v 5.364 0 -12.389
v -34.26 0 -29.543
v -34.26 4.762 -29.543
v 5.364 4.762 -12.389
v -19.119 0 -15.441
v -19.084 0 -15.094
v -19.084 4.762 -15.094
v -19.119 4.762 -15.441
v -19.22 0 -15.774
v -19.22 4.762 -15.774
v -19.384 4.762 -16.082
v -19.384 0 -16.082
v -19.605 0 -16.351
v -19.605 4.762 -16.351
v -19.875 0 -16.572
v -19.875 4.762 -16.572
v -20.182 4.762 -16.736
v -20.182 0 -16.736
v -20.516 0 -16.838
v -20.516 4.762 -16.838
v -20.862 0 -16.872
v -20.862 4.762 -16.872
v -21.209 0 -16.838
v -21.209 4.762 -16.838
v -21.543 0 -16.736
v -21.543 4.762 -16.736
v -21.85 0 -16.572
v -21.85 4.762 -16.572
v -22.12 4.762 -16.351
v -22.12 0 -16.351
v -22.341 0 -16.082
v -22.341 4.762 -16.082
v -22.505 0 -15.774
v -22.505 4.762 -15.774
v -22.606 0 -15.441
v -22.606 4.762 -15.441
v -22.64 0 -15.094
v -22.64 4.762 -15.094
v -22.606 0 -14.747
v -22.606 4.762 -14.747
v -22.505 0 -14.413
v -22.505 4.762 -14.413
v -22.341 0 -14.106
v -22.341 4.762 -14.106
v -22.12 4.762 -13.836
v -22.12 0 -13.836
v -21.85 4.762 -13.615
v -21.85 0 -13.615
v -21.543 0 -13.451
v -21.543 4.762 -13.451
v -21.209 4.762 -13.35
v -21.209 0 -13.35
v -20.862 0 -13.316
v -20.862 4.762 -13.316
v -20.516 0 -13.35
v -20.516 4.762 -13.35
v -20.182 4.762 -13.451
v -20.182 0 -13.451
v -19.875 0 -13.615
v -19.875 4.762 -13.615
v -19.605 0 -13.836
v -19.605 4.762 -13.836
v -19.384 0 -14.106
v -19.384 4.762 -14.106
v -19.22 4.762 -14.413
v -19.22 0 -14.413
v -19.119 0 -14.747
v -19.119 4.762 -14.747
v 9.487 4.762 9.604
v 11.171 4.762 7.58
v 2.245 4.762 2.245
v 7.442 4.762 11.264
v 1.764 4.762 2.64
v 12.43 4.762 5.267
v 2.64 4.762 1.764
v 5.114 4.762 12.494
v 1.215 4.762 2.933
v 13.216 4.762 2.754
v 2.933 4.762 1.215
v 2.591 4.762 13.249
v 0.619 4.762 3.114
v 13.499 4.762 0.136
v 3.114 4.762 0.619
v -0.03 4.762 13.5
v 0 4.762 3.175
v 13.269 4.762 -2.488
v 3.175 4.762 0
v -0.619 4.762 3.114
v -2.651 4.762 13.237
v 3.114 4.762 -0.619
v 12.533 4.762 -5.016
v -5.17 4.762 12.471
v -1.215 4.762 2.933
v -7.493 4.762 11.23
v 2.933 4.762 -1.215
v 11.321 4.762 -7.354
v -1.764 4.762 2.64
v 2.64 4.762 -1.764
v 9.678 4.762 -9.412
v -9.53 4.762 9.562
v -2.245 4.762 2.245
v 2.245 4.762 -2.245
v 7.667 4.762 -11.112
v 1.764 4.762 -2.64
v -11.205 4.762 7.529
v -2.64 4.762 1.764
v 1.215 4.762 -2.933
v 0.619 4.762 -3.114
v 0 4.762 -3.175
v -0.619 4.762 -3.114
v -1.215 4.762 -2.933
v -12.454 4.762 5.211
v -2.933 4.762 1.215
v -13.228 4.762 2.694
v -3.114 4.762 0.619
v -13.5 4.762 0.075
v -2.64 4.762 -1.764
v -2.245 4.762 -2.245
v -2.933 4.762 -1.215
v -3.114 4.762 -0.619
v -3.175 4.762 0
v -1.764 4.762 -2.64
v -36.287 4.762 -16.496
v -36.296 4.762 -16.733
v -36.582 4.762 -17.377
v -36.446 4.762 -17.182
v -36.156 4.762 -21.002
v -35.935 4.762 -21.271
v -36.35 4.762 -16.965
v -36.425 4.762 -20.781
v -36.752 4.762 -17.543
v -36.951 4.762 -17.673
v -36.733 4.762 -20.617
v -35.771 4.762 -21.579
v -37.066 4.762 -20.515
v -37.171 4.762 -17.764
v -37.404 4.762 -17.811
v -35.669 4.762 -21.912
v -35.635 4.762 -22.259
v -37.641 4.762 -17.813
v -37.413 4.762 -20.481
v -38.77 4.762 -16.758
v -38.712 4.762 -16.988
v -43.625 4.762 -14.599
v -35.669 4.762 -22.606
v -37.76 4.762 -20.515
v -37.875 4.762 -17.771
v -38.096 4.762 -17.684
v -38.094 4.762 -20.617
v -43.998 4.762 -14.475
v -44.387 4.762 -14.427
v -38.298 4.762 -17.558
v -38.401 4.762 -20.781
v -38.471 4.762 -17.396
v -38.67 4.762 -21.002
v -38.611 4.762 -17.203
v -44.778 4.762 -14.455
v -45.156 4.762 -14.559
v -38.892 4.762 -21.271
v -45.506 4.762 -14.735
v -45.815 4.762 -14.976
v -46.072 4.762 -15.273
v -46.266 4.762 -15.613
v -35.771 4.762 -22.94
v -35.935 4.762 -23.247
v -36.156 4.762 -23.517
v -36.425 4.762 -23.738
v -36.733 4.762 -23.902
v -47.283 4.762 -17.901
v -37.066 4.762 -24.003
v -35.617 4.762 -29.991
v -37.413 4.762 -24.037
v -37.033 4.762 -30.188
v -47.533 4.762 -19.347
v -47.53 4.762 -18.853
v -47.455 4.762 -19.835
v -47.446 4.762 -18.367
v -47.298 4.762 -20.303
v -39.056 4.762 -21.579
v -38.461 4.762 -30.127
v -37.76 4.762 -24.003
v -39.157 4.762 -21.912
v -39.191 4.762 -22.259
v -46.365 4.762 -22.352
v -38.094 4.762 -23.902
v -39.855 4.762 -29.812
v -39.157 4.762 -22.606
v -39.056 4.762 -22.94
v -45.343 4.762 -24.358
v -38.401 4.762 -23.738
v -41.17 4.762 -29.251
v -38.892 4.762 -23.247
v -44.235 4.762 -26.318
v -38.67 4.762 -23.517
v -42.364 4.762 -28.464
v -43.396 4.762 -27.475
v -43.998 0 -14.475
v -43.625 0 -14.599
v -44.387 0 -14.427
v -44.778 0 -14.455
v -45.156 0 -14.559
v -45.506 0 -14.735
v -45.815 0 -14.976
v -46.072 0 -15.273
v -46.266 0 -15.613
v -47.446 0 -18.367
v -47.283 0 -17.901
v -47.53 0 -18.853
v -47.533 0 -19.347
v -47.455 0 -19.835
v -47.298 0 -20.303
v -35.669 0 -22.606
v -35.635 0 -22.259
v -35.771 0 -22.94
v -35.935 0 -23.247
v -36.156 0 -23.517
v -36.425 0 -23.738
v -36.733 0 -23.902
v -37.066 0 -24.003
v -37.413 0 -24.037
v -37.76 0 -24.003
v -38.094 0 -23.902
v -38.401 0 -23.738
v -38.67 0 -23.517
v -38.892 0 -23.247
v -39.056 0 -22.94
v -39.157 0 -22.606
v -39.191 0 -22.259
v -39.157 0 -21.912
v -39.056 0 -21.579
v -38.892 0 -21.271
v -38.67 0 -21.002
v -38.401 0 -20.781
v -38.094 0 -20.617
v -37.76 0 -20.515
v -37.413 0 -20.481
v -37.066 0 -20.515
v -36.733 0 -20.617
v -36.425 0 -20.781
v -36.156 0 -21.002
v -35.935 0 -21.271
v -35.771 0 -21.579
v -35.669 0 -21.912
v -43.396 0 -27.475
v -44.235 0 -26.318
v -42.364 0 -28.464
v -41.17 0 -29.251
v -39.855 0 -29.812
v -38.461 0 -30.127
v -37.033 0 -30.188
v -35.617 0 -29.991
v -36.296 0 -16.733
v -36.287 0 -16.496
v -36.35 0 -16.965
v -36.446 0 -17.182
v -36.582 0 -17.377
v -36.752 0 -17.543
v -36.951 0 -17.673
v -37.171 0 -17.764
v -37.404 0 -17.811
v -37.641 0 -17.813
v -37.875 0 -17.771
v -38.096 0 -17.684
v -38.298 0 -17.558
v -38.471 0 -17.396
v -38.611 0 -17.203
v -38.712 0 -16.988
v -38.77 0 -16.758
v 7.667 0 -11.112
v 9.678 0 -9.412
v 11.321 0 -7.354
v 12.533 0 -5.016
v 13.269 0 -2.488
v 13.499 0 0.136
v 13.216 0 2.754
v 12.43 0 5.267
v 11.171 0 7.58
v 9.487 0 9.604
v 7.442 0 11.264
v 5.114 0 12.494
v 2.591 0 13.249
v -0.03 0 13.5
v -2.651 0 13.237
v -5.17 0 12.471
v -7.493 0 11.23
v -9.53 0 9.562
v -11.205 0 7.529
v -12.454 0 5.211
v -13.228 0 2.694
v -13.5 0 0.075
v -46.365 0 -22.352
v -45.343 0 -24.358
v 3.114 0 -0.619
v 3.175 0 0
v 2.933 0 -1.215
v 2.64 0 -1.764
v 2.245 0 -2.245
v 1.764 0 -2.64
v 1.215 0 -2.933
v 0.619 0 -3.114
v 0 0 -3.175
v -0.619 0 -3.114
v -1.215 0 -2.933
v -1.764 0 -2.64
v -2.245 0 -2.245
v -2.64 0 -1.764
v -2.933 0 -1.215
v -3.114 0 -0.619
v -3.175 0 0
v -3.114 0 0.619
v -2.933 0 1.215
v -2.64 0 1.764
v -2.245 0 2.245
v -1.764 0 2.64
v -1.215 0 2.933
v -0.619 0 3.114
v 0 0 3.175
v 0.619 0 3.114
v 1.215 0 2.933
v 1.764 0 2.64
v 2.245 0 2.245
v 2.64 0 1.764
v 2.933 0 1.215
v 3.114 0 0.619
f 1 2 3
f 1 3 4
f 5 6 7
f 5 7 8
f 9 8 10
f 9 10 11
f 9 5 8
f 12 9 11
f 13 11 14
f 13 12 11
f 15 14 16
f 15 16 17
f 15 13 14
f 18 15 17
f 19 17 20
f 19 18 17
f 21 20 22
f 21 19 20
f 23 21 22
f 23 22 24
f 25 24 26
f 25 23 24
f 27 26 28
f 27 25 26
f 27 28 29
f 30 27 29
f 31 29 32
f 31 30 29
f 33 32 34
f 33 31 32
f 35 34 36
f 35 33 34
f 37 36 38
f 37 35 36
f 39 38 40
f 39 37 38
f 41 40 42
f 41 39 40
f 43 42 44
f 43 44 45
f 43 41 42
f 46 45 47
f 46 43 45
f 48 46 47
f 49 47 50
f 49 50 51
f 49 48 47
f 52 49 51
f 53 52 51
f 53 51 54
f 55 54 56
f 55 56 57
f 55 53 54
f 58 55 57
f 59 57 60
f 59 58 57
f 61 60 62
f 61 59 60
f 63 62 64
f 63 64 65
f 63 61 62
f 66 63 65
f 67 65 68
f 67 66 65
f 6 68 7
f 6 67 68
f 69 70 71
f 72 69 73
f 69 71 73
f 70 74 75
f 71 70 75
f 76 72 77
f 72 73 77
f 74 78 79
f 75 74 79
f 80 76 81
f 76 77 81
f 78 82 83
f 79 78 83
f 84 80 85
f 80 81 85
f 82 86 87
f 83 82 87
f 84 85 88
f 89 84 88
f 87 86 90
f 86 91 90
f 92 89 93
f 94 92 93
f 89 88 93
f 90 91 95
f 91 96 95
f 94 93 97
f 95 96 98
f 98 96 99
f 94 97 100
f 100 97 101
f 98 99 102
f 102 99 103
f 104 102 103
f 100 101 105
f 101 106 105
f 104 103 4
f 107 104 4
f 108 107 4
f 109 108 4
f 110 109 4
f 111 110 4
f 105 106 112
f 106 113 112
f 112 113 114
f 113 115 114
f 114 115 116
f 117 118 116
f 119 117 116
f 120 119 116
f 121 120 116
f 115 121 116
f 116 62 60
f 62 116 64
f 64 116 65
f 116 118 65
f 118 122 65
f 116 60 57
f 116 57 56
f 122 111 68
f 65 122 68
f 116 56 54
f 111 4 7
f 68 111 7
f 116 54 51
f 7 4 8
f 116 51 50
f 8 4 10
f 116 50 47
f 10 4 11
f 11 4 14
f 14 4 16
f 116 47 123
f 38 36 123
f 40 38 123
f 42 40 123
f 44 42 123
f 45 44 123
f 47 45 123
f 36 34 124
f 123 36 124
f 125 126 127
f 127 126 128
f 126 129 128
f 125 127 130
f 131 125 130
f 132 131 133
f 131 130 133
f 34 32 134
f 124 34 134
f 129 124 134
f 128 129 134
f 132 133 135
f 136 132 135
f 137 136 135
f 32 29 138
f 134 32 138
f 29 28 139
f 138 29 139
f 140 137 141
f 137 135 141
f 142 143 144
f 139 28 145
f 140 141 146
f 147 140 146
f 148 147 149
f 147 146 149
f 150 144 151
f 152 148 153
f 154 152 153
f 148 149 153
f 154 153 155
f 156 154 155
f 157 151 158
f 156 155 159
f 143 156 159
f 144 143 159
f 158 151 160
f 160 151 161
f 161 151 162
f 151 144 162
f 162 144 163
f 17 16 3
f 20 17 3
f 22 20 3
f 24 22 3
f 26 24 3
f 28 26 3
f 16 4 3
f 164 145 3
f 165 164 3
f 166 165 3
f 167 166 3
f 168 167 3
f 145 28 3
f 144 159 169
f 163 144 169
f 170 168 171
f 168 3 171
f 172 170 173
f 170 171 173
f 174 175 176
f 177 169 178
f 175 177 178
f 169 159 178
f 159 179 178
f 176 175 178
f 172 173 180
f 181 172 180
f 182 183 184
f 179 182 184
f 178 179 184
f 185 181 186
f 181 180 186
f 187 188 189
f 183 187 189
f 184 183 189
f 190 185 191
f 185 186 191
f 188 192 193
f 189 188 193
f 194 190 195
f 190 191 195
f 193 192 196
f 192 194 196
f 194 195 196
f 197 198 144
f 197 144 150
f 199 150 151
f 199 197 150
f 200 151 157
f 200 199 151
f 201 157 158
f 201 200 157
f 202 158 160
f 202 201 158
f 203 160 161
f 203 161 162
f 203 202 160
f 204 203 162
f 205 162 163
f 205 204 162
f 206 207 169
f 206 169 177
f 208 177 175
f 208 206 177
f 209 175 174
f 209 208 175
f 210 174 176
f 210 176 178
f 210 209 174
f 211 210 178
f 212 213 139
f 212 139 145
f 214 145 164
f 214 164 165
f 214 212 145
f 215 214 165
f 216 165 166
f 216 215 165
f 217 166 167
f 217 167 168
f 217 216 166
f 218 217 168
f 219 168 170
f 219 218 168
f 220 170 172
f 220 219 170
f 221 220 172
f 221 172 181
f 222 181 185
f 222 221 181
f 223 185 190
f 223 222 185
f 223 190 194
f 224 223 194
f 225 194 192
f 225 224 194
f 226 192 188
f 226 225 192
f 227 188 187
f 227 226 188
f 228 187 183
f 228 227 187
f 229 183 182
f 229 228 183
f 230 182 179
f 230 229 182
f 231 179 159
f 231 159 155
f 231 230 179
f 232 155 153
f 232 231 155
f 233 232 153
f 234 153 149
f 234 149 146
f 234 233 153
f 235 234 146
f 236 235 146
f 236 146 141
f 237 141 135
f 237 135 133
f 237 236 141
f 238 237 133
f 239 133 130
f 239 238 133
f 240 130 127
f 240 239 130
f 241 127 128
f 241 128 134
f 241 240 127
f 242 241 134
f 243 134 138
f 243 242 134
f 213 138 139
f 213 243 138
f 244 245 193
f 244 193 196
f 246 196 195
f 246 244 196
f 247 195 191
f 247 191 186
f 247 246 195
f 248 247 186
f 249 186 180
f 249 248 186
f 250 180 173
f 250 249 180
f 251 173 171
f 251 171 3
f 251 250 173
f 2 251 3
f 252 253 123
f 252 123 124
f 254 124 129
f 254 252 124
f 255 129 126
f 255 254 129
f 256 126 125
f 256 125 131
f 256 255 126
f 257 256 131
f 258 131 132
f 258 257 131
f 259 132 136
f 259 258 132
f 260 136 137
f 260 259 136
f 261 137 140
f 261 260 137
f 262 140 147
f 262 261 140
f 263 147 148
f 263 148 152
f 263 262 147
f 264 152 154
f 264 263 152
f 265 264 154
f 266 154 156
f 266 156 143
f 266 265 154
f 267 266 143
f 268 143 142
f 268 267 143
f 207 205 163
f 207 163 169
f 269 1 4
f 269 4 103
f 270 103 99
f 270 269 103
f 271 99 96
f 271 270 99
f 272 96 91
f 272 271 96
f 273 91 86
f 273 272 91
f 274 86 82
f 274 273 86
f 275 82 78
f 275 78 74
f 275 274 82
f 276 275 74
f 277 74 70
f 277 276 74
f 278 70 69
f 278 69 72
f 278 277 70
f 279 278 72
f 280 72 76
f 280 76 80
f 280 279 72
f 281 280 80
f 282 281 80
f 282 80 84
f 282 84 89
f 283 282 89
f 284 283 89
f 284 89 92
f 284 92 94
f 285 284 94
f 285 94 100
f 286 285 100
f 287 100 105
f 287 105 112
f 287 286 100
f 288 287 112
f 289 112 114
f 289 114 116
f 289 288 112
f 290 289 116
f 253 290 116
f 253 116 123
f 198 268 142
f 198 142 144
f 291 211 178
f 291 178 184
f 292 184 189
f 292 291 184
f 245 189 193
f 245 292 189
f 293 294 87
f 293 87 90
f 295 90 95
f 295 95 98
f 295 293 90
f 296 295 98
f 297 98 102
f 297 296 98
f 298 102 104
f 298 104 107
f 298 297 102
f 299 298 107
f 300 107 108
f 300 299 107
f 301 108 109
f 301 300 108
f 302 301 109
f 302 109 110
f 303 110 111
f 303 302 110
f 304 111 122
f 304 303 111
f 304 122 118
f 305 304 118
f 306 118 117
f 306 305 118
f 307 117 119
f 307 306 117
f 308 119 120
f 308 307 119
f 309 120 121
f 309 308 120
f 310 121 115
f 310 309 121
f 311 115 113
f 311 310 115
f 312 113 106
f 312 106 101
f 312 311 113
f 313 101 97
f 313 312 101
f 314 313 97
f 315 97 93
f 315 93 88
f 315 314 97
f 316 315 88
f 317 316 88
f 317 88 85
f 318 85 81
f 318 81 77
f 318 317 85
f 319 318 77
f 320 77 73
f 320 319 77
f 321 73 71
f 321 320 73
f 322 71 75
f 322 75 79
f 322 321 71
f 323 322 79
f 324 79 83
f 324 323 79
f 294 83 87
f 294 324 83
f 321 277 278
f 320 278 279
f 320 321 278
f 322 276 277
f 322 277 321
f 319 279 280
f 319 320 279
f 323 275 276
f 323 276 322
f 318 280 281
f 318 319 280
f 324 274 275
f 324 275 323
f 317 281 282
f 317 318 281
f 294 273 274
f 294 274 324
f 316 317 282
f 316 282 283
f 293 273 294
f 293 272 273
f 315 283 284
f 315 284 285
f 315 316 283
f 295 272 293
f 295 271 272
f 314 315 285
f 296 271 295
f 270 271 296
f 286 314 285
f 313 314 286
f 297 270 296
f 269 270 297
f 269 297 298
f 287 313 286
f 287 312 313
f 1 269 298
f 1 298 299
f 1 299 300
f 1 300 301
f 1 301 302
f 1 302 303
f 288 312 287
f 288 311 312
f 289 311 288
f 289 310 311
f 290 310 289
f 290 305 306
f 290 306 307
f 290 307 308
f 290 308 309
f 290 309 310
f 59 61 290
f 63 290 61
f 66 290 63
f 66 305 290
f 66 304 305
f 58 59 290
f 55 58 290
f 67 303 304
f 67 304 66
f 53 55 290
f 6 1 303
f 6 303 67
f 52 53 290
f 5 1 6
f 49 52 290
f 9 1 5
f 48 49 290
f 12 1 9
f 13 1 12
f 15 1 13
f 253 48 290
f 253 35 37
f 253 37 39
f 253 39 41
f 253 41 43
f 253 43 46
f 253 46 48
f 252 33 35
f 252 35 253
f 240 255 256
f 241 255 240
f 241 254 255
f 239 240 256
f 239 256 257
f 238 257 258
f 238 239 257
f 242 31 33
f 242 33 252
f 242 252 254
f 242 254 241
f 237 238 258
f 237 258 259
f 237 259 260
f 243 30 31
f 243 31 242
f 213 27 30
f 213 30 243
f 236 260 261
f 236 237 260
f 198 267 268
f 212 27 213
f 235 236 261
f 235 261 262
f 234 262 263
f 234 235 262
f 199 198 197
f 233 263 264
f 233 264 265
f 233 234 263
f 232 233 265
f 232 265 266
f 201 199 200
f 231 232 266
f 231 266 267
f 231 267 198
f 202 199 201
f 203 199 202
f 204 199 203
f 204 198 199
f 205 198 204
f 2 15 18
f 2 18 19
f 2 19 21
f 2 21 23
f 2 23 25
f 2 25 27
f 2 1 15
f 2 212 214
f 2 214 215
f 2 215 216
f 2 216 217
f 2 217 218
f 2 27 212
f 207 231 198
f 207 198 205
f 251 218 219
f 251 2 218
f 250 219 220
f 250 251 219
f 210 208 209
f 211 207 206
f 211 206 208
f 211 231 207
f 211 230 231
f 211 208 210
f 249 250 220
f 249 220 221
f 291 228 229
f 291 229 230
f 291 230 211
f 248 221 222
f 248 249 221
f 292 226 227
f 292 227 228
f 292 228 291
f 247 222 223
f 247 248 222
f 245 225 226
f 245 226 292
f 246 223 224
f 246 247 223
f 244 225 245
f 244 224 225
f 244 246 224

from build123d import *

# Parameters (mm, degrees)
SKETCH1_R           = 1.778
SKETCH1_R_2         = 3.175
BOSS_EXTRUDE1_DEPTH = 4.7625


with BuildPart() as part:
    # Sketch1 → Boss-Extrude1 (new body)
    with BuildSketch(Plane(origin=(0, 0, 0), x_dir=(1, 0, 0), z_dir=(0, 1, 0))):
        with BuildLine():
            Line((-38.770225031, 16.757963615), (-43.625448569, 14.598747375))
            ThreePointArc((-43.625448569, 14.598747375), (-45.155674622, 14.559326862), (-46.265582353, 15.613485569))
            Line((-46.265582353, 15.613485569), (-47.282683039, 17.900542834))
            ThreePointArc((-47.282683039, 17.900542834), (-47.541465806, 19.100109045), (-47.298283286, 20.302934833))
            ThreePointArc((-47.298283286, 20.302934833), (-45.865213893, 23.360627542), (-44.234733225, 26.317772344))
            ThreePointArc((-44.234733225, 26.317772344), (-39.855484626, 29.811728531), (-34.259632886, 29.543416329))
            Line((-34.259632886, 29.543416329), (5.363638877, 12.388760148))
            ThreePointArc((5.363638877, 12.388760148), (7.44200849, -11.263503435), (-13.499793526, -0.074664302))
            Line((-13.499793526, -0.074664302), (-36.286855081, 16.495885282))
            ThreePointArc((-36.286855081, 16.495885282), (-37.403602541, 17.810792136), (-38.770225031, 16.757963615))
        make_face()
        with Locations((-20.862458922, 15.093717491)):
            Circle(SKETCH1_R, mode=Mode.SUBTRACT)
        Circle(SKETCH1_R_2, mode=Mode.SUBTRACT)
        with Locations((-37.413253893, 22.259284205)):
            Circle(SKETCH1_R, mode=Mode.SUBTRACT)
    extrude(amount=BOSS_EXTRUDE1_DEPTH)


solid = part.part
